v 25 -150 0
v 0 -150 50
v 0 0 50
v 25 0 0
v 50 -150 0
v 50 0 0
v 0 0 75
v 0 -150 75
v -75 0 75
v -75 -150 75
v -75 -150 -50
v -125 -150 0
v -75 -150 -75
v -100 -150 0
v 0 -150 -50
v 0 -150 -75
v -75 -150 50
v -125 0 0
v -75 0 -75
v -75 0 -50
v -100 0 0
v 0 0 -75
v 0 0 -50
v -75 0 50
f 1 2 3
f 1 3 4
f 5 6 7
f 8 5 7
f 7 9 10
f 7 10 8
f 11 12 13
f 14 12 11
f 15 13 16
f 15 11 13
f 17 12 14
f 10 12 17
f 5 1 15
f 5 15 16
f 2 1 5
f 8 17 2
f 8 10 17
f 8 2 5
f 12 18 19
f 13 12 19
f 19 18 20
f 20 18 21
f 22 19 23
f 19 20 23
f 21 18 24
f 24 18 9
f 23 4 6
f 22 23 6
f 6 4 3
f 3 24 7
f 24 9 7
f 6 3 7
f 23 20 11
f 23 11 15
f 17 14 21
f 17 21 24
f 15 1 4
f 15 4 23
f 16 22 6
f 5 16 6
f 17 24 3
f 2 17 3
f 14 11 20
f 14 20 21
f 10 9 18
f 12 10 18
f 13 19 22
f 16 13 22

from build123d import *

# Parameters (mm, degrees)
F0_W     = 75
F0_H     = 25
F1_DEPTH = 150


with BuildPart() as f1:
    # F0 (on Front) → F1 (new body)
    with BuildSketch(Plane.XZ):
        with Locations((-37.5, 62.5)):
            Rectangle(F0_W, F0_H)
        Polygon((50, 0), (0, 75), (0, 50), (25, 0), align=None)
        Polygon((-75, 50), (-75, 75), (-125, 0), (-100, 0), align=None)
        Polygon((0, -75), (50, 0), (25, 0), (0, -50), align=None)
        Polygon((-100, 0), (-125, 0), (-75, -75), (-75, -50), align=None)
        with Locations((-37.5, -62.5)):
            Rectangle(F0_W, F0_H)
    extrude(amount=F1_DEPTH)


solid = f1.part
